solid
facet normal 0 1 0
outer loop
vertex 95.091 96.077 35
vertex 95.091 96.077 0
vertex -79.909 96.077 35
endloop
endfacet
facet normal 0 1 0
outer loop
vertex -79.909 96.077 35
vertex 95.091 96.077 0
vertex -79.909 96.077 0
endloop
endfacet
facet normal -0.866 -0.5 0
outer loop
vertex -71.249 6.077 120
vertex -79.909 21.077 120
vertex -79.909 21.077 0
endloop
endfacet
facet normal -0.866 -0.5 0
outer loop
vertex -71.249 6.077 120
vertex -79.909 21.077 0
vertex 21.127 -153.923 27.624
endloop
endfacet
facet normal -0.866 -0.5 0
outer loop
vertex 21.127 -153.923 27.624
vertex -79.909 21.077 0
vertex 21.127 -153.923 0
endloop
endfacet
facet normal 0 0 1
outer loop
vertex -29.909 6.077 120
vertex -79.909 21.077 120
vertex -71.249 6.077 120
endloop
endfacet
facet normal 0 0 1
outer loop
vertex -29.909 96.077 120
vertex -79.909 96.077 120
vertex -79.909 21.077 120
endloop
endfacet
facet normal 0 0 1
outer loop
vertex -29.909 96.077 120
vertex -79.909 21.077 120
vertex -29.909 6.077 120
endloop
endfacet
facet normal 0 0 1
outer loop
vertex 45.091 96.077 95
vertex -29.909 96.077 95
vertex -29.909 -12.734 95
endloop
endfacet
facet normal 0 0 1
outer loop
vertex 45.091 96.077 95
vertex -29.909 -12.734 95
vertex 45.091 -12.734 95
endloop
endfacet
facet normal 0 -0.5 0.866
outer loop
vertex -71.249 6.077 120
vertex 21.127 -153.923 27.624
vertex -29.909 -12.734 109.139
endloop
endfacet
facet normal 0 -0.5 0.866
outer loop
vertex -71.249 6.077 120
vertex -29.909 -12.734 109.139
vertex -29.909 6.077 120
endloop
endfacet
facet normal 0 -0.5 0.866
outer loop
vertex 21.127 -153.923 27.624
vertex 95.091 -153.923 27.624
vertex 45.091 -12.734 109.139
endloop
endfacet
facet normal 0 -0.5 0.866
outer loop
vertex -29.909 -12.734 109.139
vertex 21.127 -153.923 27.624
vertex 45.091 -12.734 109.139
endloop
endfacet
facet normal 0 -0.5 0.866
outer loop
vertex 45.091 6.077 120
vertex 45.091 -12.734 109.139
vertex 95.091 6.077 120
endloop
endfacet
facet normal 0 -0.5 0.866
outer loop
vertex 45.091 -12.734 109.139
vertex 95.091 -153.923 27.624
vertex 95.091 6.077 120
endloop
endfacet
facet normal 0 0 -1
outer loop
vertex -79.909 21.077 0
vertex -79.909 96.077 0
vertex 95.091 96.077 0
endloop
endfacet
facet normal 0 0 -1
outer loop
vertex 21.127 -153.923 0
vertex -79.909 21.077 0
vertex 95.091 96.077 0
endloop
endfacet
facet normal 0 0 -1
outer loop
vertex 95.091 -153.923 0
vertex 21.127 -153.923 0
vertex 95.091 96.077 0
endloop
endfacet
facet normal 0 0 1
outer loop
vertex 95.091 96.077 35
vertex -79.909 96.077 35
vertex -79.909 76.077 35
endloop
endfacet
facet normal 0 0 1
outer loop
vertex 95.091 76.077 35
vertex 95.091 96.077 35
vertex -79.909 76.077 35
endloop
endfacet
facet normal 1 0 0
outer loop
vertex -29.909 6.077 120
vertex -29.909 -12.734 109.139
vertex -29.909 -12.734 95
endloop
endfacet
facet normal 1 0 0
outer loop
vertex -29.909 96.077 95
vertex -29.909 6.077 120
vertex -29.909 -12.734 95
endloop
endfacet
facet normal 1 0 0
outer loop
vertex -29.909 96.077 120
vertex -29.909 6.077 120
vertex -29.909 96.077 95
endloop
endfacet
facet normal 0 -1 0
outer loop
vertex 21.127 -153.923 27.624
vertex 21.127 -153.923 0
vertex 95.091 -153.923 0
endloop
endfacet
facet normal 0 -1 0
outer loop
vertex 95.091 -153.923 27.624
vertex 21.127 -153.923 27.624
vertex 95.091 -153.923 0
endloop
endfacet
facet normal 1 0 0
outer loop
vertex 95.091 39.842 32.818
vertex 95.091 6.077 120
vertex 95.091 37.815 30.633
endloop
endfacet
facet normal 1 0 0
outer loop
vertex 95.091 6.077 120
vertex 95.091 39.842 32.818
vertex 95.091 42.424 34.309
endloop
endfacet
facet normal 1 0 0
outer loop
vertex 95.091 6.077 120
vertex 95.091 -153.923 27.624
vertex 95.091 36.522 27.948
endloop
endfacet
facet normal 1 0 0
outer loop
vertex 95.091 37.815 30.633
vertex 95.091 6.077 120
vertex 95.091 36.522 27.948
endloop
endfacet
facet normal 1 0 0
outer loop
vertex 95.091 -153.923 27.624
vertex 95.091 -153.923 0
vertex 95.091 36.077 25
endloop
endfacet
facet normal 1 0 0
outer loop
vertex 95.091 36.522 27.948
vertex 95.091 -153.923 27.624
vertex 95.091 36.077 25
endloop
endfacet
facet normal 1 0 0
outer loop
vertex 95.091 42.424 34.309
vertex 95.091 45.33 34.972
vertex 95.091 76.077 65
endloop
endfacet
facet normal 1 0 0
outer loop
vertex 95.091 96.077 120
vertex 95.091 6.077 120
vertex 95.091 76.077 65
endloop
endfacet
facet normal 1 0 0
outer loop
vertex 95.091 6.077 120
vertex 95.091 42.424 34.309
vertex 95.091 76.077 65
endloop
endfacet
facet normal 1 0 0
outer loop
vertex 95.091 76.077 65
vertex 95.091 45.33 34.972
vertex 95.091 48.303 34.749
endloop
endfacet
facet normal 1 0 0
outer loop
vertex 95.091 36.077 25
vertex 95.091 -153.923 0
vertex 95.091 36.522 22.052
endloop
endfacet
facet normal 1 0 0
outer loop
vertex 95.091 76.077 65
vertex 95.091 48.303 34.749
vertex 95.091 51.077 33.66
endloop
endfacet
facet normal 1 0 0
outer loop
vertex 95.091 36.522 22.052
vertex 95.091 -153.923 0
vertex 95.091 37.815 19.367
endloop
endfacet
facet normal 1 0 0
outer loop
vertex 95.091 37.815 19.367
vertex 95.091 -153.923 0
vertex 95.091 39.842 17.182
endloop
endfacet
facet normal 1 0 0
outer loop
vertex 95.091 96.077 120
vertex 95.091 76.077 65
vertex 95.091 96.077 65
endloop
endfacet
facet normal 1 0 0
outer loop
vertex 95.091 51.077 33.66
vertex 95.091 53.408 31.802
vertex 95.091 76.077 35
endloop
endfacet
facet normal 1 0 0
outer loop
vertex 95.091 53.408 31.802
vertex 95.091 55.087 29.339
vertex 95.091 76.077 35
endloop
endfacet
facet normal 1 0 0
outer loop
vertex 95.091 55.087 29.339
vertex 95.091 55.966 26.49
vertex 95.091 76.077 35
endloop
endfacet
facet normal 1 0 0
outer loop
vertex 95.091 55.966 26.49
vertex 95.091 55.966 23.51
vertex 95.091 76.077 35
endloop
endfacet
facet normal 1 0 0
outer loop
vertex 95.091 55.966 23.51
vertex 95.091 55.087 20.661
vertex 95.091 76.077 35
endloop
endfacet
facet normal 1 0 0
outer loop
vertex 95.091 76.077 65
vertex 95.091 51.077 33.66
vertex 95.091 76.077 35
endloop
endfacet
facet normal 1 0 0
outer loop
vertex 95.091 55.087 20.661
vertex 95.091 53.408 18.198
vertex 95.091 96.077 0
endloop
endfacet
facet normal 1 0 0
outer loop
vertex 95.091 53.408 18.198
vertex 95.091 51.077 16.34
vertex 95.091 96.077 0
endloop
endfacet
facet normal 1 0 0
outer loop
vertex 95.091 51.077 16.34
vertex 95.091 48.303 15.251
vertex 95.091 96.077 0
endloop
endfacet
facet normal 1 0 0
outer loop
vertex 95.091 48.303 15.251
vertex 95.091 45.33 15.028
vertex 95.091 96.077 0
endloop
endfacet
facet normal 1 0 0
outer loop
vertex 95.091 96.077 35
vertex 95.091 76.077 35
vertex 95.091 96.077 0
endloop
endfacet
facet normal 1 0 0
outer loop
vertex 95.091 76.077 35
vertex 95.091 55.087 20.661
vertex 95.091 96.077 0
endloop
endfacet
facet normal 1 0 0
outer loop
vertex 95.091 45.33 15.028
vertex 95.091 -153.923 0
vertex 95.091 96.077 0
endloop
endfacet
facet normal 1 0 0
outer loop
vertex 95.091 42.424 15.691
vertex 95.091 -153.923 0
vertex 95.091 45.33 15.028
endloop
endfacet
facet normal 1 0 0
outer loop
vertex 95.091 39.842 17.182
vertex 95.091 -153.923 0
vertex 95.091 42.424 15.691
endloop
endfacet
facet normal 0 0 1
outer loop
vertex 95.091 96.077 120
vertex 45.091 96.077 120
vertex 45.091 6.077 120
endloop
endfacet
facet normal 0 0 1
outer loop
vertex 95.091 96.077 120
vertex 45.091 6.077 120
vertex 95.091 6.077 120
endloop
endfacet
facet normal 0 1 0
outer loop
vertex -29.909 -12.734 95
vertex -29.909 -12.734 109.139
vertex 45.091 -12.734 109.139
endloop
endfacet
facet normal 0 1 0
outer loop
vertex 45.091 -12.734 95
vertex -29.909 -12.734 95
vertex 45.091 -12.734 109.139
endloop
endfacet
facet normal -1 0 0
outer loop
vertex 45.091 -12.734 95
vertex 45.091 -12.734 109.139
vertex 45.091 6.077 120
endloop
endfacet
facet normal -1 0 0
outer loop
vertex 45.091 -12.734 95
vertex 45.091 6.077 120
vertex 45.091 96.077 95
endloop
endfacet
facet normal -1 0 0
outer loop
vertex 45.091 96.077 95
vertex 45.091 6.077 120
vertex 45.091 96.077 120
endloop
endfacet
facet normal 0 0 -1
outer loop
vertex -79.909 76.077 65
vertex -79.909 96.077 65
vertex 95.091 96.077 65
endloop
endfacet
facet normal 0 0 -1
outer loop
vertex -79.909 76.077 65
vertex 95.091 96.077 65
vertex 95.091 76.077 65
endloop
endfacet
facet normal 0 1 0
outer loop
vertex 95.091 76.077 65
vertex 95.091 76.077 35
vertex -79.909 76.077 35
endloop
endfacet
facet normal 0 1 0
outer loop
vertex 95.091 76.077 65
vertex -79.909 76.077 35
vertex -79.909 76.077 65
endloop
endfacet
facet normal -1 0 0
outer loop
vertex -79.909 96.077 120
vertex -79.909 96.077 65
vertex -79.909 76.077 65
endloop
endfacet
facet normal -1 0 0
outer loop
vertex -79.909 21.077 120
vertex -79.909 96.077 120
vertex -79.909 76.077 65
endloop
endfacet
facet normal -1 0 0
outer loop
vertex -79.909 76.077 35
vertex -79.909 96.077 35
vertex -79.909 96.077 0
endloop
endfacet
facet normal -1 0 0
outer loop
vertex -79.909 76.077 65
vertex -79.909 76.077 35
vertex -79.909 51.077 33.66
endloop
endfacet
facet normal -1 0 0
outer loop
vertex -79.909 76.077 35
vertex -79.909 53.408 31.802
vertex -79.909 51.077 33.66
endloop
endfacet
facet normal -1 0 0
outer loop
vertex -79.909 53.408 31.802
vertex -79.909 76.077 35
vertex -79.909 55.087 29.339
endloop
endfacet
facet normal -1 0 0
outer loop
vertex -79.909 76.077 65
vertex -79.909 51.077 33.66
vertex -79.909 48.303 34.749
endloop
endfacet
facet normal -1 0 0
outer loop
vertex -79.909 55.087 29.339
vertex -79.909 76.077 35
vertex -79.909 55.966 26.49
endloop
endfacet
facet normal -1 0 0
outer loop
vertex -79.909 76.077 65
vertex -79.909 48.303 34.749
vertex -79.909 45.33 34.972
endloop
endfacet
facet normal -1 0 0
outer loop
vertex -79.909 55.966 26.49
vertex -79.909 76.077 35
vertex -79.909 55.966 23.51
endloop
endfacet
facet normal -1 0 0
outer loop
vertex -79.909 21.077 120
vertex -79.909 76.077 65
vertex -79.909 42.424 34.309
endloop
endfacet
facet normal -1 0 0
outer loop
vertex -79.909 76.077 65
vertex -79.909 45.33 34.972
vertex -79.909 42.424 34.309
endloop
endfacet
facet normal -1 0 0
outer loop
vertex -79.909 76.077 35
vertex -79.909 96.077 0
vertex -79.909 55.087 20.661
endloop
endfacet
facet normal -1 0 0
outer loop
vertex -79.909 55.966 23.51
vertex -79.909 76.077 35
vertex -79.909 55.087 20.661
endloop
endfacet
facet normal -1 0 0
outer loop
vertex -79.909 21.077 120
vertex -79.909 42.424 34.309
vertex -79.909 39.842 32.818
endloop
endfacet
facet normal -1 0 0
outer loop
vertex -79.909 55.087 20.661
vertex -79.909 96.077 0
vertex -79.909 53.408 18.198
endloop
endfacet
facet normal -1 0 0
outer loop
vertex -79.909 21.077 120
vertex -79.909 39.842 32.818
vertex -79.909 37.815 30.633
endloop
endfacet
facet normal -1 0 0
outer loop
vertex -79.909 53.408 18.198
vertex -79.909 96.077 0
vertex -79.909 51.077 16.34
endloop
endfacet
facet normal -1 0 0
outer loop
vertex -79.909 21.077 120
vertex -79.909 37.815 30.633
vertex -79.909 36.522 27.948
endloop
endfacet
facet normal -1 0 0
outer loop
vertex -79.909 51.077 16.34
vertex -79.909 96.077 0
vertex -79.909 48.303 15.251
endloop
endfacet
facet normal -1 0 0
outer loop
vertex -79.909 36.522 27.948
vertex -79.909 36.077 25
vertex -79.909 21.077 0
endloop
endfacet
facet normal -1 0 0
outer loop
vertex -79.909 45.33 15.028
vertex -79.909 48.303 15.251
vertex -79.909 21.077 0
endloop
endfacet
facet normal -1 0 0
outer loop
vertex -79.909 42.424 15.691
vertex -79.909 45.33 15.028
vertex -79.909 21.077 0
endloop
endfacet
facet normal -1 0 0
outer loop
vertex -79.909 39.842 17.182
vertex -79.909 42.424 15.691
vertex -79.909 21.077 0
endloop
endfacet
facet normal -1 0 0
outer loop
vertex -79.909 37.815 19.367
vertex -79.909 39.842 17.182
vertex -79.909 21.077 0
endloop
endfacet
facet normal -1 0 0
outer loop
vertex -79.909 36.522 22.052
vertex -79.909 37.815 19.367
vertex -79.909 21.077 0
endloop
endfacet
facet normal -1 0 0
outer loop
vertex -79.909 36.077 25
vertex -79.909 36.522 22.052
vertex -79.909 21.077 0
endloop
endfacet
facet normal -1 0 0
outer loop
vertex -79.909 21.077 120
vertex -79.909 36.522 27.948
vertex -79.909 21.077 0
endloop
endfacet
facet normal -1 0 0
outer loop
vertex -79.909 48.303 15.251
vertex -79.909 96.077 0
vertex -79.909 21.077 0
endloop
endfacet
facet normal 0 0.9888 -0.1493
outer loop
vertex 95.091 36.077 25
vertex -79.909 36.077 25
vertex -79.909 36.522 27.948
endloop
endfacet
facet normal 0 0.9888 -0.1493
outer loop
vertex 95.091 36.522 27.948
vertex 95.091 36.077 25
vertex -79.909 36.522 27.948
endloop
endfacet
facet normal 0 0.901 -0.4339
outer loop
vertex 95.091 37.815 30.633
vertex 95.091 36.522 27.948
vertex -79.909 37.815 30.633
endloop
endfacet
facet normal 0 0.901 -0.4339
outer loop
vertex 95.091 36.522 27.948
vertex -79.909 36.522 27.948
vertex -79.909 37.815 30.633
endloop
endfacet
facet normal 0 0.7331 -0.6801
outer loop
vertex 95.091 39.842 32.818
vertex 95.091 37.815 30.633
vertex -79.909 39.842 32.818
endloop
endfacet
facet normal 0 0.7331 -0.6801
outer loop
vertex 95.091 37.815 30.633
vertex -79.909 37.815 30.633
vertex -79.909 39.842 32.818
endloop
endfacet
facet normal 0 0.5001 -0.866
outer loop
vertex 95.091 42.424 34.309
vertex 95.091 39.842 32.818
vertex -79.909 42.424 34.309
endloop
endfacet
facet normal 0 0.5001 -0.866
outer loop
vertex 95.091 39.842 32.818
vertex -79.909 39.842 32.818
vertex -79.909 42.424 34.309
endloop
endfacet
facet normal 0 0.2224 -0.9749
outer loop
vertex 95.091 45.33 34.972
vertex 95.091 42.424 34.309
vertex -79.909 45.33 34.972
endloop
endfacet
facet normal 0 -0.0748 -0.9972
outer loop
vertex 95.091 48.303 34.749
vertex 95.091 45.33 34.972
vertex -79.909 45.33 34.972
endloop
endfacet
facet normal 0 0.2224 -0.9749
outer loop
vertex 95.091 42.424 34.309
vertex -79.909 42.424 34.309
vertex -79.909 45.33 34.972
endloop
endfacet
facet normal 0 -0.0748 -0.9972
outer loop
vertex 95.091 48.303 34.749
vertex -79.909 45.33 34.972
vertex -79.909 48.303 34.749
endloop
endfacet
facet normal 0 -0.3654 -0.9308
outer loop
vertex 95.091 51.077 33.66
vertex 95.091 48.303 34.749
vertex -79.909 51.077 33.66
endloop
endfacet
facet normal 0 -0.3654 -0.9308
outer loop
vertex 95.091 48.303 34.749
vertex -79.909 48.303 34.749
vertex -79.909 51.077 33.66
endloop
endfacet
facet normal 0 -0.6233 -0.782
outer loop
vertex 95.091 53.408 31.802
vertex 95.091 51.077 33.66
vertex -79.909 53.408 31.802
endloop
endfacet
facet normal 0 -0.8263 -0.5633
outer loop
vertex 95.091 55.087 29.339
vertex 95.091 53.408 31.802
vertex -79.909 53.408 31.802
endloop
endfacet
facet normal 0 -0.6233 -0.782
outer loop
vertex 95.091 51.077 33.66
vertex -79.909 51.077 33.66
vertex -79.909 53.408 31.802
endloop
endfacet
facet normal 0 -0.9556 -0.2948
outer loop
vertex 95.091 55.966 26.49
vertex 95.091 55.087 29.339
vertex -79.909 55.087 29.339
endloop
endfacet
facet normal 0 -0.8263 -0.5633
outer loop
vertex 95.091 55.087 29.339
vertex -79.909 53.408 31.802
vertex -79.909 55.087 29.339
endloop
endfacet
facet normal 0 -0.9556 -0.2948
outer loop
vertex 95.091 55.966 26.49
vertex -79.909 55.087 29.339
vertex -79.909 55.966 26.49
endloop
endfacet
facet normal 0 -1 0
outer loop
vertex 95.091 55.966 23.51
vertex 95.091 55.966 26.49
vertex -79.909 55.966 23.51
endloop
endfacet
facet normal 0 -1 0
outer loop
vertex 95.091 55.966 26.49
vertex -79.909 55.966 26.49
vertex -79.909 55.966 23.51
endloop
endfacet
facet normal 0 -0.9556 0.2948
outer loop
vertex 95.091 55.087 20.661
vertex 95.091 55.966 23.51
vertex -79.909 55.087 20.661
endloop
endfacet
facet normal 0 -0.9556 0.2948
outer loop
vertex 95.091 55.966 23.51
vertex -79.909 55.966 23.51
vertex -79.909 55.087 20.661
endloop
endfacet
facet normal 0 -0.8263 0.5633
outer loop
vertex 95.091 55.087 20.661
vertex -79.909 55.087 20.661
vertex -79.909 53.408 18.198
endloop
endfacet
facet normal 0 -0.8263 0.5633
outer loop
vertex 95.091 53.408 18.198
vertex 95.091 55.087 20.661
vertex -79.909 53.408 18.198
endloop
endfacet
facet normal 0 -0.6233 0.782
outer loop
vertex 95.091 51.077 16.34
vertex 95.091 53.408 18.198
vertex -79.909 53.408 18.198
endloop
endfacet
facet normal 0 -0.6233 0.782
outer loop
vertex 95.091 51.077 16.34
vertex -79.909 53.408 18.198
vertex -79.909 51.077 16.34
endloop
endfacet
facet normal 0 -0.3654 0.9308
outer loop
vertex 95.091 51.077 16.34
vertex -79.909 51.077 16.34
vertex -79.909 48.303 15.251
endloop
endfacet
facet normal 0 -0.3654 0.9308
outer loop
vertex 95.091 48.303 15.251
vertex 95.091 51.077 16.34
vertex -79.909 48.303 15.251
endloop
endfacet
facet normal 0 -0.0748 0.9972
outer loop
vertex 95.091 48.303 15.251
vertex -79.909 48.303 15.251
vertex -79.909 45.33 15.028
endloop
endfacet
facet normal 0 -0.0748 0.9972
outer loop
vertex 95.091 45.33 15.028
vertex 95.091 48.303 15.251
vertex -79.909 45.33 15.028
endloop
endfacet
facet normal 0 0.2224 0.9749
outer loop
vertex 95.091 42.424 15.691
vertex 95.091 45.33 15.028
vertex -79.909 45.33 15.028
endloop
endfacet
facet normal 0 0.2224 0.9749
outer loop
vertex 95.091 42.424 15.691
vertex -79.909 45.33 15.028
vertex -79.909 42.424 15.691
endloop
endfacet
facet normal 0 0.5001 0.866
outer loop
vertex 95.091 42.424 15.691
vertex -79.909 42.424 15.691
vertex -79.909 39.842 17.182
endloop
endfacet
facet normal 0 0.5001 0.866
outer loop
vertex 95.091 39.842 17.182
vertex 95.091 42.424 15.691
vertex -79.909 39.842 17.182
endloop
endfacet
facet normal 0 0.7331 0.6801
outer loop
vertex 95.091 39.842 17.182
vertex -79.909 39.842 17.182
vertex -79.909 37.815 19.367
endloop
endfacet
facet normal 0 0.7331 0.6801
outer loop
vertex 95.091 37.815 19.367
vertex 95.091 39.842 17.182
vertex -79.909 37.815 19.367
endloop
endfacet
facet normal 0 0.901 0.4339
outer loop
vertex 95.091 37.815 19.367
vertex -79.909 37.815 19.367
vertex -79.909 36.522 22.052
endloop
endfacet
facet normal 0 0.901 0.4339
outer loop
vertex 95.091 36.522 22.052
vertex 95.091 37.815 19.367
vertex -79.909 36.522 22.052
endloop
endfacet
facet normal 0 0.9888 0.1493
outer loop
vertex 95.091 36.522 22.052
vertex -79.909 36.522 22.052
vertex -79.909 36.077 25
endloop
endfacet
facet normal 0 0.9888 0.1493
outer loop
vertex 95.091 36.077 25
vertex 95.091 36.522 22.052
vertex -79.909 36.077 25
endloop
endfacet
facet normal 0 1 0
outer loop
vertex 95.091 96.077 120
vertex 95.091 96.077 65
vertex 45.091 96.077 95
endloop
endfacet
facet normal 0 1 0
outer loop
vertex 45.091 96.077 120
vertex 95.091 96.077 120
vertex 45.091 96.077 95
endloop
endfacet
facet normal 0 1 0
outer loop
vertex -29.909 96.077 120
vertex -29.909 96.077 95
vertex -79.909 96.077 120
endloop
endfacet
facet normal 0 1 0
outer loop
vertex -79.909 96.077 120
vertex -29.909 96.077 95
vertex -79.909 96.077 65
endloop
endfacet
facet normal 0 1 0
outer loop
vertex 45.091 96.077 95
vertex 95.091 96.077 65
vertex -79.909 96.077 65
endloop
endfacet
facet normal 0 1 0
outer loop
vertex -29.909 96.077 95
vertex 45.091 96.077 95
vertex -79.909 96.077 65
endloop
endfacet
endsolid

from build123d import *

# Parameters (mm, degrees)
F1_DEPTH = 120
F3_DEPTH = 175.001
F4_W     = 75
F4_H     = 108.811668
F5_DEPTH = 25
F6_W     = 20
F6_H     = 30
F6_R     = 10
F7_DEPTH = 175.001


with BuildPart() as f1:
    # F0 (on Top) → F1 (new body)
    with BuildSketch(Plane.XY):
        Polygon((-29.908918, 96.077366), (-79.908918, 96.077366), (-79.908918, 21.077366), (21.127379, -153.922634), (95.091082, -153.922634), (95.091082, 96.077366), (32.76388, 96.077366), align=None)
    extrude(amount=F1_DEPTH)

    # F2 (on face) → F3 (cut, through all)
    with BuildSketch(Plane.YZ.offset(95.091082)):
        Polygon((-153.922634, 27.623957), (6.077366, 120), (-153.922634, 120), align=None)
    extrude(amount=-F3_DEPTH, mode=Mode.SUBTRACT)

    # F4 (on face) → F5 (cut)
    with BuildSketch(Plane.XY.offset(120)):
        with Locations((7.591082, 41.671532)):
            Rectangle(F4_W, F4_H)
    extrude(amount=-F5_DEPTH, mode=Mode.SUBTRACT)

    # F6 (on face) → F7 (cut, through all)
    with BuildSketch(Plane(origin=(-79.908918, 0, 0), x_dir=(0, -1, 0), z_dir=(-1, 0, 0))):
        with Locations((-86.077366, 50)):
            Rectangle(F6_W, F6_H)
        with Locations((-46.077366, 25)):
            Circle(F6_R)
    extrude(amount=-F7_DEPTH, mode=Mode.SUBTRACT)


solid = f1.part
